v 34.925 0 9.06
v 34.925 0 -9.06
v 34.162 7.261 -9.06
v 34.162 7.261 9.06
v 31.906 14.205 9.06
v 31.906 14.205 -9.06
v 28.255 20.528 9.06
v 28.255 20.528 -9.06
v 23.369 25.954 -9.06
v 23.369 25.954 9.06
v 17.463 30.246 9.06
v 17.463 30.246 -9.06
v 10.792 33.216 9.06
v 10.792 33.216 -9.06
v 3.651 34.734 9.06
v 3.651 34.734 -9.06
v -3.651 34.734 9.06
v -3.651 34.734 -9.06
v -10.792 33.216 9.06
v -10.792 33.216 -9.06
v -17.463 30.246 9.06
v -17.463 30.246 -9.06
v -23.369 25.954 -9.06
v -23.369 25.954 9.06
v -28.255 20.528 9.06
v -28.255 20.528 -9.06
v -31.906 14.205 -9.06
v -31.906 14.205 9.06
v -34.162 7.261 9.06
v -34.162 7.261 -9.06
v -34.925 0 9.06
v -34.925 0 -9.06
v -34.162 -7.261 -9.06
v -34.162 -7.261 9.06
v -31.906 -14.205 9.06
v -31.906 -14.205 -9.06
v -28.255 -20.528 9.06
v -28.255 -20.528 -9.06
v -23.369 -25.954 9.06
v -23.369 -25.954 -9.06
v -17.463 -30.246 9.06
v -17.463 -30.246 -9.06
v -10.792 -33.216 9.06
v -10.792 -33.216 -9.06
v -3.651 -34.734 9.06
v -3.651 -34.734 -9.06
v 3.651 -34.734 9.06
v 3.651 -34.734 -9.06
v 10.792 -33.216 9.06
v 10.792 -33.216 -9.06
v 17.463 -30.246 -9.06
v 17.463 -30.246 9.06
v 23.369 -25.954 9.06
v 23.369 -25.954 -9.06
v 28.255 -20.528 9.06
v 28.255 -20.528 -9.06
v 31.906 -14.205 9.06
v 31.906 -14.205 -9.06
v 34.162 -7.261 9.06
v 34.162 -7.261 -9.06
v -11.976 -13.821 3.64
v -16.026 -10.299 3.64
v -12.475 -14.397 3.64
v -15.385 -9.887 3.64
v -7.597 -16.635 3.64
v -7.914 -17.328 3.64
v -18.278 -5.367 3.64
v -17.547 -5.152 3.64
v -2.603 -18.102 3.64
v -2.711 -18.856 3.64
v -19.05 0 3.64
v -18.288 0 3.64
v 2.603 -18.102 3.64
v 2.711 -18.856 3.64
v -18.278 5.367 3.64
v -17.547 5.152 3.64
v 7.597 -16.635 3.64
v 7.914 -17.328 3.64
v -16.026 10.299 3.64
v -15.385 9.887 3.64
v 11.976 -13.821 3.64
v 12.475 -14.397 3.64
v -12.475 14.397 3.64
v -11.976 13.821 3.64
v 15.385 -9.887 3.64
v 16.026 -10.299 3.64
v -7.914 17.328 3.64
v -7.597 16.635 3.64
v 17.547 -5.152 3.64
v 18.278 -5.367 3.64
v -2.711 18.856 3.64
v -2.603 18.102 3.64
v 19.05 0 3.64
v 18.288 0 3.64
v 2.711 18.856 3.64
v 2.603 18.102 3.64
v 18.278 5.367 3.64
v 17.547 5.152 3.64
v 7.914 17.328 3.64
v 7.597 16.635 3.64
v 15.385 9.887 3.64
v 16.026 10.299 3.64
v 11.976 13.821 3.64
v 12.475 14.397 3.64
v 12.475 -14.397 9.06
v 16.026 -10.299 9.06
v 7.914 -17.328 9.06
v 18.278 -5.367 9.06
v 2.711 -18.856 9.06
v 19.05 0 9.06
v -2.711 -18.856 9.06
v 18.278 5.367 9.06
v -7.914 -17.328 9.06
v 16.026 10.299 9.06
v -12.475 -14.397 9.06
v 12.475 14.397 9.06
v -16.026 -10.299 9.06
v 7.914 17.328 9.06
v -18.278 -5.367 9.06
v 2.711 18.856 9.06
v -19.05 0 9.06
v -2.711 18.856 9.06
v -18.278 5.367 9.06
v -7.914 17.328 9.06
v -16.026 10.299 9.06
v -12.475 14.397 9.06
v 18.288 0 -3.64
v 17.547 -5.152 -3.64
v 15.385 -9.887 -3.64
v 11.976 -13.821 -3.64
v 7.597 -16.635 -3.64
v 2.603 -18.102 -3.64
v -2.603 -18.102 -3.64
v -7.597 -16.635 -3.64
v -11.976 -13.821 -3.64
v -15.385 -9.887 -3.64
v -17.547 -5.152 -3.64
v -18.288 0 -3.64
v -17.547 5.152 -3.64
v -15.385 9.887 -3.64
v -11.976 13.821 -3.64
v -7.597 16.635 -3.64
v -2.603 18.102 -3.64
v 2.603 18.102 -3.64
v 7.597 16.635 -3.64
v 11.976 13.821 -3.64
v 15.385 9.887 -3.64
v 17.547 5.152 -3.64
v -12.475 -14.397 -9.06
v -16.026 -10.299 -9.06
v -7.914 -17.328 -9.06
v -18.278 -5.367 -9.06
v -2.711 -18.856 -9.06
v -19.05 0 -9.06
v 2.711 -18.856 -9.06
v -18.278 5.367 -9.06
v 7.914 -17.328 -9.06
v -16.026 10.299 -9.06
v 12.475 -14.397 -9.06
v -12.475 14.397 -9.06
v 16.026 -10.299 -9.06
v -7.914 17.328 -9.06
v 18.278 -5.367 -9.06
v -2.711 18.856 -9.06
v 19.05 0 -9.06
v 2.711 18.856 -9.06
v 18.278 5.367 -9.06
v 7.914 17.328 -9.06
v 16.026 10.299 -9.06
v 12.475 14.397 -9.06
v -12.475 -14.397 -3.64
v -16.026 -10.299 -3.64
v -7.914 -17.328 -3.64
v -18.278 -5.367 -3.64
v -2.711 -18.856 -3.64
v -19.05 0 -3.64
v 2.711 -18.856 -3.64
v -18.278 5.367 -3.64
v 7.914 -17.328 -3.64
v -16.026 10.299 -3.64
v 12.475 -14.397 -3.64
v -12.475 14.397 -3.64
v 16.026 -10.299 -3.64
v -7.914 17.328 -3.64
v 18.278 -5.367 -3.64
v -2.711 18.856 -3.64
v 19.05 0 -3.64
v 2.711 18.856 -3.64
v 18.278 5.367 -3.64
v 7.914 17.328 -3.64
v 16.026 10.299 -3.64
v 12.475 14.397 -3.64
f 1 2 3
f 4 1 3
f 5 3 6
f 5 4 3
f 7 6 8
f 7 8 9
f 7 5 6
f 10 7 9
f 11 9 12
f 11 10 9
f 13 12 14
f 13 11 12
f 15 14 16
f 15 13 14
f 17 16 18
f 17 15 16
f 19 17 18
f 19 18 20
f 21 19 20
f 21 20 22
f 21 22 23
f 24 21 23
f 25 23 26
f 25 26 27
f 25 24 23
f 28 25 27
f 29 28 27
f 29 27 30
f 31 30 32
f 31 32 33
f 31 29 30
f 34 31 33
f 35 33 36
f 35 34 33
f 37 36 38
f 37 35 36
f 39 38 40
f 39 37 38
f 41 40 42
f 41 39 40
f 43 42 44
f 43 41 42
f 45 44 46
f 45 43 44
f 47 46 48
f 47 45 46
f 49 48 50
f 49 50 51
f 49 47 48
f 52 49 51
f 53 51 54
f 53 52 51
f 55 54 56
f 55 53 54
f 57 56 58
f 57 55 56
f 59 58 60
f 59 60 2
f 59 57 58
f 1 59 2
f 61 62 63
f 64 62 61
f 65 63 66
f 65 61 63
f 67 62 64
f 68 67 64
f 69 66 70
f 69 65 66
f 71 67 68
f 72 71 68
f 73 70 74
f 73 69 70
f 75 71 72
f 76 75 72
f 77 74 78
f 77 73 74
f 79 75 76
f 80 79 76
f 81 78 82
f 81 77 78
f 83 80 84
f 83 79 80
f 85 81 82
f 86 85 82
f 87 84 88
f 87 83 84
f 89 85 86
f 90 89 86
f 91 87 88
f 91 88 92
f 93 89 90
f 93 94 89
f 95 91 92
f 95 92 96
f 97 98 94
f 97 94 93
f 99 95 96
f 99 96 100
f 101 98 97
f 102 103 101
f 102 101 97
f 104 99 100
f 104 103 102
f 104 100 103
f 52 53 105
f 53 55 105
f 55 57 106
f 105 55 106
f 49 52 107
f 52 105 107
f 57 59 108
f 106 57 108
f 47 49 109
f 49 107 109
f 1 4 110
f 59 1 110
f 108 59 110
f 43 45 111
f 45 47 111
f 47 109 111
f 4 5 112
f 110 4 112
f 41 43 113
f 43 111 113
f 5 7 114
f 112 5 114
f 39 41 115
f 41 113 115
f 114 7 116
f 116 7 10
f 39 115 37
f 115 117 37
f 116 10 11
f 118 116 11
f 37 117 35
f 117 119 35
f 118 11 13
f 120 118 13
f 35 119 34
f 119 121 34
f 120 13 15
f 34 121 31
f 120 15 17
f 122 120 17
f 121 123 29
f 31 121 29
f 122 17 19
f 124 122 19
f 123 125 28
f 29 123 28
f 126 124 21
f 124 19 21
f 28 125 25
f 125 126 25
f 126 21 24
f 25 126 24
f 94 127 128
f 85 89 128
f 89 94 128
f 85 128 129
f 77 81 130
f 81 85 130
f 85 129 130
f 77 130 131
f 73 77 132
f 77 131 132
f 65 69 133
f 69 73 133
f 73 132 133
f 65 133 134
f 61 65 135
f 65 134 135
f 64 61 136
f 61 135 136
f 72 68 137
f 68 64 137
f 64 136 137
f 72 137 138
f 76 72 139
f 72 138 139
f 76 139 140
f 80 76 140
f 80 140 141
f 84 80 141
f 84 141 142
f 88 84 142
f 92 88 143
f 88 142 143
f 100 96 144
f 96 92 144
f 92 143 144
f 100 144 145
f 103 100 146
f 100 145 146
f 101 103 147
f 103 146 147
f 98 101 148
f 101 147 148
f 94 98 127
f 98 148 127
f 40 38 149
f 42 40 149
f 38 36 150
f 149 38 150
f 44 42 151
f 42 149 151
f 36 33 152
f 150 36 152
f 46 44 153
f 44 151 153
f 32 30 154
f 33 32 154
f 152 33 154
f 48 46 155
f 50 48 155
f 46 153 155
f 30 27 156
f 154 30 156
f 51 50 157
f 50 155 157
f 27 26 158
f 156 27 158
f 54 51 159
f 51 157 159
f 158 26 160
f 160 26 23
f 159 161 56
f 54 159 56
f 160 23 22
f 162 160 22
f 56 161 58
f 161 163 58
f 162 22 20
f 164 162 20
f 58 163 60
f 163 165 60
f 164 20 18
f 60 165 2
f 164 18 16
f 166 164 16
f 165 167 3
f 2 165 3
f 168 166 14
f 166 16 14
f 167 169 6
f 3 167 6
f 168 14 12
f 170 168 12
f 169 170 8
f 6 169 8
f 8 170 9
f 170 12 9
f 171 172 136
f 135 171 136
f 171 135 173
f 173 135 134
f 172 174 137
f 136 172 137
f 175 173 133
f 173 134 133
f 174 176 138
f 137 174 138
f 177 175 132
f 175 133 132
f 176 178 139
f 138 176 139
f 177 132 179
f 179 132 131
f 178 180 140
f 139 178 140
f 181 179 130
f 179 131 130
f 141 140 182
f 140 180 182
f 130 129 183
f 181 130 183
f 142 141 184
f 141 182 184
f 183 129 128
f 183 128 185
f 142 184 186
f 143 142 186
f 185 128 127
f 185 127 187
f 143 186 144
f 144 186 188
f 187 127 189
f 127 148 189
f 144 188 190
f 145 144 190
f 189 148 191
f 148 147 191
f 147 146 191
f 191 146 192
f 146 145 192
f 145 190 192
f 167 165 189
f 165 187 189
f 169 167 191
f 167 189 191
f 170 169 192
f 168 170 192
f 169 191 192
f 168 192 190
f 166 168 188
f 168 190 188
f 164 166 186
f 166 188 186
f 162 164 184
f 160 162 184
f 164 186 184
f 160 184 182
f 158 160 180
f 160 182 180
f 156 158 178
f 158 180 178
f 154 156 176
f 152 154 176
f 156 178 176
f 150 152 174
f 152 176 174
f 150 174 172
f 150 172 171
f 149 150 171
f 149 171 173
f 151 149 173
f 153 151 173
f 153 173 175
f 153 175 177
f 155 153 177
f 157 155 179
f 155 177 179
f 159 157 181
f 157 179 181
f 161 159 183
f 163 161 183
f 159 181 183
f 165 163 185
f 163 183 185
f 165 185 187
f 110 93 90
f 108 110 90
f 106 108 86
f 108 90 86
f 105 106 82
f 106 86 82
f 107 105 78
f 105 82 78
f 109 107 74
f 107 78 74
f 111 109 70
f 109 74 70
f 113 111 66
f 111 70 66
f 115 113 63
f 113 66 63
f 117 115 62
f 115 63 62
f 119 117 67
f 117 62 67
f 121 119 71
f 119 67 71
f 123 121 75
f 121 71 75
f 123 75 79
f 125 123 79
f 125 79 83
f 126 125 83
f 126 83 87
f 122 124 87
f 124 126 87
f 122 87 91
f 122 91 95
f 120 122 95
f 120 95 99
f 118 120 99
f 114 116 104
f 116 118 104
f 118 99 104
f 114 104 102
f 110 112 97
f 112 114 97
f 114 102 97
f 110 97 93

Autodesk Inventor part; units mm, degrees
ref_plane "YZ Plane" through (0, 0, 0) normal (1, 0, 0) x (0, 1, 0)
ref_plane "XZ Plane" through (0, 0, 0) normal (0, 1, 0) x (-1, 0, 0)
ref_plane "XY Plane" through (0, 0, 0) normal (0, 0, 1) x (1, 0, 0)
sketch "Sketch1" plane through (0, 0, 0) normal (0, 0, 1) x (1, 0, 0)
  circle A0 centre (0, 0) radius 19.05
  circle A1 centre (0, 0) radius 18.288
  dimension "d6" = 38.1
  dimension "d14" = 36.576
extrude "Extrusion1" add sketch "Sketch1" along normal mid plane 7.28
sketch "Sketch2" plane through (0, 0, 3.64) normal (0, 0, 1) x (1, 0, 0)
  circle A0 centre (0, 0) radius 34.925
  circle A1 centre (0, 0) radius 19.05 projected
  dimension "d10" = 69.85
extrude "Extrusion2" add sketch "Sketch2" against normal blind 12.7
mirror "Mirror1" about plane through (0, 0, 0) normal (0, 0, 1) of "Extrusion2"
equation "\"d7\" = Length"
equation "\"Length\" = 7.28"
properties part number "Drift1615"
